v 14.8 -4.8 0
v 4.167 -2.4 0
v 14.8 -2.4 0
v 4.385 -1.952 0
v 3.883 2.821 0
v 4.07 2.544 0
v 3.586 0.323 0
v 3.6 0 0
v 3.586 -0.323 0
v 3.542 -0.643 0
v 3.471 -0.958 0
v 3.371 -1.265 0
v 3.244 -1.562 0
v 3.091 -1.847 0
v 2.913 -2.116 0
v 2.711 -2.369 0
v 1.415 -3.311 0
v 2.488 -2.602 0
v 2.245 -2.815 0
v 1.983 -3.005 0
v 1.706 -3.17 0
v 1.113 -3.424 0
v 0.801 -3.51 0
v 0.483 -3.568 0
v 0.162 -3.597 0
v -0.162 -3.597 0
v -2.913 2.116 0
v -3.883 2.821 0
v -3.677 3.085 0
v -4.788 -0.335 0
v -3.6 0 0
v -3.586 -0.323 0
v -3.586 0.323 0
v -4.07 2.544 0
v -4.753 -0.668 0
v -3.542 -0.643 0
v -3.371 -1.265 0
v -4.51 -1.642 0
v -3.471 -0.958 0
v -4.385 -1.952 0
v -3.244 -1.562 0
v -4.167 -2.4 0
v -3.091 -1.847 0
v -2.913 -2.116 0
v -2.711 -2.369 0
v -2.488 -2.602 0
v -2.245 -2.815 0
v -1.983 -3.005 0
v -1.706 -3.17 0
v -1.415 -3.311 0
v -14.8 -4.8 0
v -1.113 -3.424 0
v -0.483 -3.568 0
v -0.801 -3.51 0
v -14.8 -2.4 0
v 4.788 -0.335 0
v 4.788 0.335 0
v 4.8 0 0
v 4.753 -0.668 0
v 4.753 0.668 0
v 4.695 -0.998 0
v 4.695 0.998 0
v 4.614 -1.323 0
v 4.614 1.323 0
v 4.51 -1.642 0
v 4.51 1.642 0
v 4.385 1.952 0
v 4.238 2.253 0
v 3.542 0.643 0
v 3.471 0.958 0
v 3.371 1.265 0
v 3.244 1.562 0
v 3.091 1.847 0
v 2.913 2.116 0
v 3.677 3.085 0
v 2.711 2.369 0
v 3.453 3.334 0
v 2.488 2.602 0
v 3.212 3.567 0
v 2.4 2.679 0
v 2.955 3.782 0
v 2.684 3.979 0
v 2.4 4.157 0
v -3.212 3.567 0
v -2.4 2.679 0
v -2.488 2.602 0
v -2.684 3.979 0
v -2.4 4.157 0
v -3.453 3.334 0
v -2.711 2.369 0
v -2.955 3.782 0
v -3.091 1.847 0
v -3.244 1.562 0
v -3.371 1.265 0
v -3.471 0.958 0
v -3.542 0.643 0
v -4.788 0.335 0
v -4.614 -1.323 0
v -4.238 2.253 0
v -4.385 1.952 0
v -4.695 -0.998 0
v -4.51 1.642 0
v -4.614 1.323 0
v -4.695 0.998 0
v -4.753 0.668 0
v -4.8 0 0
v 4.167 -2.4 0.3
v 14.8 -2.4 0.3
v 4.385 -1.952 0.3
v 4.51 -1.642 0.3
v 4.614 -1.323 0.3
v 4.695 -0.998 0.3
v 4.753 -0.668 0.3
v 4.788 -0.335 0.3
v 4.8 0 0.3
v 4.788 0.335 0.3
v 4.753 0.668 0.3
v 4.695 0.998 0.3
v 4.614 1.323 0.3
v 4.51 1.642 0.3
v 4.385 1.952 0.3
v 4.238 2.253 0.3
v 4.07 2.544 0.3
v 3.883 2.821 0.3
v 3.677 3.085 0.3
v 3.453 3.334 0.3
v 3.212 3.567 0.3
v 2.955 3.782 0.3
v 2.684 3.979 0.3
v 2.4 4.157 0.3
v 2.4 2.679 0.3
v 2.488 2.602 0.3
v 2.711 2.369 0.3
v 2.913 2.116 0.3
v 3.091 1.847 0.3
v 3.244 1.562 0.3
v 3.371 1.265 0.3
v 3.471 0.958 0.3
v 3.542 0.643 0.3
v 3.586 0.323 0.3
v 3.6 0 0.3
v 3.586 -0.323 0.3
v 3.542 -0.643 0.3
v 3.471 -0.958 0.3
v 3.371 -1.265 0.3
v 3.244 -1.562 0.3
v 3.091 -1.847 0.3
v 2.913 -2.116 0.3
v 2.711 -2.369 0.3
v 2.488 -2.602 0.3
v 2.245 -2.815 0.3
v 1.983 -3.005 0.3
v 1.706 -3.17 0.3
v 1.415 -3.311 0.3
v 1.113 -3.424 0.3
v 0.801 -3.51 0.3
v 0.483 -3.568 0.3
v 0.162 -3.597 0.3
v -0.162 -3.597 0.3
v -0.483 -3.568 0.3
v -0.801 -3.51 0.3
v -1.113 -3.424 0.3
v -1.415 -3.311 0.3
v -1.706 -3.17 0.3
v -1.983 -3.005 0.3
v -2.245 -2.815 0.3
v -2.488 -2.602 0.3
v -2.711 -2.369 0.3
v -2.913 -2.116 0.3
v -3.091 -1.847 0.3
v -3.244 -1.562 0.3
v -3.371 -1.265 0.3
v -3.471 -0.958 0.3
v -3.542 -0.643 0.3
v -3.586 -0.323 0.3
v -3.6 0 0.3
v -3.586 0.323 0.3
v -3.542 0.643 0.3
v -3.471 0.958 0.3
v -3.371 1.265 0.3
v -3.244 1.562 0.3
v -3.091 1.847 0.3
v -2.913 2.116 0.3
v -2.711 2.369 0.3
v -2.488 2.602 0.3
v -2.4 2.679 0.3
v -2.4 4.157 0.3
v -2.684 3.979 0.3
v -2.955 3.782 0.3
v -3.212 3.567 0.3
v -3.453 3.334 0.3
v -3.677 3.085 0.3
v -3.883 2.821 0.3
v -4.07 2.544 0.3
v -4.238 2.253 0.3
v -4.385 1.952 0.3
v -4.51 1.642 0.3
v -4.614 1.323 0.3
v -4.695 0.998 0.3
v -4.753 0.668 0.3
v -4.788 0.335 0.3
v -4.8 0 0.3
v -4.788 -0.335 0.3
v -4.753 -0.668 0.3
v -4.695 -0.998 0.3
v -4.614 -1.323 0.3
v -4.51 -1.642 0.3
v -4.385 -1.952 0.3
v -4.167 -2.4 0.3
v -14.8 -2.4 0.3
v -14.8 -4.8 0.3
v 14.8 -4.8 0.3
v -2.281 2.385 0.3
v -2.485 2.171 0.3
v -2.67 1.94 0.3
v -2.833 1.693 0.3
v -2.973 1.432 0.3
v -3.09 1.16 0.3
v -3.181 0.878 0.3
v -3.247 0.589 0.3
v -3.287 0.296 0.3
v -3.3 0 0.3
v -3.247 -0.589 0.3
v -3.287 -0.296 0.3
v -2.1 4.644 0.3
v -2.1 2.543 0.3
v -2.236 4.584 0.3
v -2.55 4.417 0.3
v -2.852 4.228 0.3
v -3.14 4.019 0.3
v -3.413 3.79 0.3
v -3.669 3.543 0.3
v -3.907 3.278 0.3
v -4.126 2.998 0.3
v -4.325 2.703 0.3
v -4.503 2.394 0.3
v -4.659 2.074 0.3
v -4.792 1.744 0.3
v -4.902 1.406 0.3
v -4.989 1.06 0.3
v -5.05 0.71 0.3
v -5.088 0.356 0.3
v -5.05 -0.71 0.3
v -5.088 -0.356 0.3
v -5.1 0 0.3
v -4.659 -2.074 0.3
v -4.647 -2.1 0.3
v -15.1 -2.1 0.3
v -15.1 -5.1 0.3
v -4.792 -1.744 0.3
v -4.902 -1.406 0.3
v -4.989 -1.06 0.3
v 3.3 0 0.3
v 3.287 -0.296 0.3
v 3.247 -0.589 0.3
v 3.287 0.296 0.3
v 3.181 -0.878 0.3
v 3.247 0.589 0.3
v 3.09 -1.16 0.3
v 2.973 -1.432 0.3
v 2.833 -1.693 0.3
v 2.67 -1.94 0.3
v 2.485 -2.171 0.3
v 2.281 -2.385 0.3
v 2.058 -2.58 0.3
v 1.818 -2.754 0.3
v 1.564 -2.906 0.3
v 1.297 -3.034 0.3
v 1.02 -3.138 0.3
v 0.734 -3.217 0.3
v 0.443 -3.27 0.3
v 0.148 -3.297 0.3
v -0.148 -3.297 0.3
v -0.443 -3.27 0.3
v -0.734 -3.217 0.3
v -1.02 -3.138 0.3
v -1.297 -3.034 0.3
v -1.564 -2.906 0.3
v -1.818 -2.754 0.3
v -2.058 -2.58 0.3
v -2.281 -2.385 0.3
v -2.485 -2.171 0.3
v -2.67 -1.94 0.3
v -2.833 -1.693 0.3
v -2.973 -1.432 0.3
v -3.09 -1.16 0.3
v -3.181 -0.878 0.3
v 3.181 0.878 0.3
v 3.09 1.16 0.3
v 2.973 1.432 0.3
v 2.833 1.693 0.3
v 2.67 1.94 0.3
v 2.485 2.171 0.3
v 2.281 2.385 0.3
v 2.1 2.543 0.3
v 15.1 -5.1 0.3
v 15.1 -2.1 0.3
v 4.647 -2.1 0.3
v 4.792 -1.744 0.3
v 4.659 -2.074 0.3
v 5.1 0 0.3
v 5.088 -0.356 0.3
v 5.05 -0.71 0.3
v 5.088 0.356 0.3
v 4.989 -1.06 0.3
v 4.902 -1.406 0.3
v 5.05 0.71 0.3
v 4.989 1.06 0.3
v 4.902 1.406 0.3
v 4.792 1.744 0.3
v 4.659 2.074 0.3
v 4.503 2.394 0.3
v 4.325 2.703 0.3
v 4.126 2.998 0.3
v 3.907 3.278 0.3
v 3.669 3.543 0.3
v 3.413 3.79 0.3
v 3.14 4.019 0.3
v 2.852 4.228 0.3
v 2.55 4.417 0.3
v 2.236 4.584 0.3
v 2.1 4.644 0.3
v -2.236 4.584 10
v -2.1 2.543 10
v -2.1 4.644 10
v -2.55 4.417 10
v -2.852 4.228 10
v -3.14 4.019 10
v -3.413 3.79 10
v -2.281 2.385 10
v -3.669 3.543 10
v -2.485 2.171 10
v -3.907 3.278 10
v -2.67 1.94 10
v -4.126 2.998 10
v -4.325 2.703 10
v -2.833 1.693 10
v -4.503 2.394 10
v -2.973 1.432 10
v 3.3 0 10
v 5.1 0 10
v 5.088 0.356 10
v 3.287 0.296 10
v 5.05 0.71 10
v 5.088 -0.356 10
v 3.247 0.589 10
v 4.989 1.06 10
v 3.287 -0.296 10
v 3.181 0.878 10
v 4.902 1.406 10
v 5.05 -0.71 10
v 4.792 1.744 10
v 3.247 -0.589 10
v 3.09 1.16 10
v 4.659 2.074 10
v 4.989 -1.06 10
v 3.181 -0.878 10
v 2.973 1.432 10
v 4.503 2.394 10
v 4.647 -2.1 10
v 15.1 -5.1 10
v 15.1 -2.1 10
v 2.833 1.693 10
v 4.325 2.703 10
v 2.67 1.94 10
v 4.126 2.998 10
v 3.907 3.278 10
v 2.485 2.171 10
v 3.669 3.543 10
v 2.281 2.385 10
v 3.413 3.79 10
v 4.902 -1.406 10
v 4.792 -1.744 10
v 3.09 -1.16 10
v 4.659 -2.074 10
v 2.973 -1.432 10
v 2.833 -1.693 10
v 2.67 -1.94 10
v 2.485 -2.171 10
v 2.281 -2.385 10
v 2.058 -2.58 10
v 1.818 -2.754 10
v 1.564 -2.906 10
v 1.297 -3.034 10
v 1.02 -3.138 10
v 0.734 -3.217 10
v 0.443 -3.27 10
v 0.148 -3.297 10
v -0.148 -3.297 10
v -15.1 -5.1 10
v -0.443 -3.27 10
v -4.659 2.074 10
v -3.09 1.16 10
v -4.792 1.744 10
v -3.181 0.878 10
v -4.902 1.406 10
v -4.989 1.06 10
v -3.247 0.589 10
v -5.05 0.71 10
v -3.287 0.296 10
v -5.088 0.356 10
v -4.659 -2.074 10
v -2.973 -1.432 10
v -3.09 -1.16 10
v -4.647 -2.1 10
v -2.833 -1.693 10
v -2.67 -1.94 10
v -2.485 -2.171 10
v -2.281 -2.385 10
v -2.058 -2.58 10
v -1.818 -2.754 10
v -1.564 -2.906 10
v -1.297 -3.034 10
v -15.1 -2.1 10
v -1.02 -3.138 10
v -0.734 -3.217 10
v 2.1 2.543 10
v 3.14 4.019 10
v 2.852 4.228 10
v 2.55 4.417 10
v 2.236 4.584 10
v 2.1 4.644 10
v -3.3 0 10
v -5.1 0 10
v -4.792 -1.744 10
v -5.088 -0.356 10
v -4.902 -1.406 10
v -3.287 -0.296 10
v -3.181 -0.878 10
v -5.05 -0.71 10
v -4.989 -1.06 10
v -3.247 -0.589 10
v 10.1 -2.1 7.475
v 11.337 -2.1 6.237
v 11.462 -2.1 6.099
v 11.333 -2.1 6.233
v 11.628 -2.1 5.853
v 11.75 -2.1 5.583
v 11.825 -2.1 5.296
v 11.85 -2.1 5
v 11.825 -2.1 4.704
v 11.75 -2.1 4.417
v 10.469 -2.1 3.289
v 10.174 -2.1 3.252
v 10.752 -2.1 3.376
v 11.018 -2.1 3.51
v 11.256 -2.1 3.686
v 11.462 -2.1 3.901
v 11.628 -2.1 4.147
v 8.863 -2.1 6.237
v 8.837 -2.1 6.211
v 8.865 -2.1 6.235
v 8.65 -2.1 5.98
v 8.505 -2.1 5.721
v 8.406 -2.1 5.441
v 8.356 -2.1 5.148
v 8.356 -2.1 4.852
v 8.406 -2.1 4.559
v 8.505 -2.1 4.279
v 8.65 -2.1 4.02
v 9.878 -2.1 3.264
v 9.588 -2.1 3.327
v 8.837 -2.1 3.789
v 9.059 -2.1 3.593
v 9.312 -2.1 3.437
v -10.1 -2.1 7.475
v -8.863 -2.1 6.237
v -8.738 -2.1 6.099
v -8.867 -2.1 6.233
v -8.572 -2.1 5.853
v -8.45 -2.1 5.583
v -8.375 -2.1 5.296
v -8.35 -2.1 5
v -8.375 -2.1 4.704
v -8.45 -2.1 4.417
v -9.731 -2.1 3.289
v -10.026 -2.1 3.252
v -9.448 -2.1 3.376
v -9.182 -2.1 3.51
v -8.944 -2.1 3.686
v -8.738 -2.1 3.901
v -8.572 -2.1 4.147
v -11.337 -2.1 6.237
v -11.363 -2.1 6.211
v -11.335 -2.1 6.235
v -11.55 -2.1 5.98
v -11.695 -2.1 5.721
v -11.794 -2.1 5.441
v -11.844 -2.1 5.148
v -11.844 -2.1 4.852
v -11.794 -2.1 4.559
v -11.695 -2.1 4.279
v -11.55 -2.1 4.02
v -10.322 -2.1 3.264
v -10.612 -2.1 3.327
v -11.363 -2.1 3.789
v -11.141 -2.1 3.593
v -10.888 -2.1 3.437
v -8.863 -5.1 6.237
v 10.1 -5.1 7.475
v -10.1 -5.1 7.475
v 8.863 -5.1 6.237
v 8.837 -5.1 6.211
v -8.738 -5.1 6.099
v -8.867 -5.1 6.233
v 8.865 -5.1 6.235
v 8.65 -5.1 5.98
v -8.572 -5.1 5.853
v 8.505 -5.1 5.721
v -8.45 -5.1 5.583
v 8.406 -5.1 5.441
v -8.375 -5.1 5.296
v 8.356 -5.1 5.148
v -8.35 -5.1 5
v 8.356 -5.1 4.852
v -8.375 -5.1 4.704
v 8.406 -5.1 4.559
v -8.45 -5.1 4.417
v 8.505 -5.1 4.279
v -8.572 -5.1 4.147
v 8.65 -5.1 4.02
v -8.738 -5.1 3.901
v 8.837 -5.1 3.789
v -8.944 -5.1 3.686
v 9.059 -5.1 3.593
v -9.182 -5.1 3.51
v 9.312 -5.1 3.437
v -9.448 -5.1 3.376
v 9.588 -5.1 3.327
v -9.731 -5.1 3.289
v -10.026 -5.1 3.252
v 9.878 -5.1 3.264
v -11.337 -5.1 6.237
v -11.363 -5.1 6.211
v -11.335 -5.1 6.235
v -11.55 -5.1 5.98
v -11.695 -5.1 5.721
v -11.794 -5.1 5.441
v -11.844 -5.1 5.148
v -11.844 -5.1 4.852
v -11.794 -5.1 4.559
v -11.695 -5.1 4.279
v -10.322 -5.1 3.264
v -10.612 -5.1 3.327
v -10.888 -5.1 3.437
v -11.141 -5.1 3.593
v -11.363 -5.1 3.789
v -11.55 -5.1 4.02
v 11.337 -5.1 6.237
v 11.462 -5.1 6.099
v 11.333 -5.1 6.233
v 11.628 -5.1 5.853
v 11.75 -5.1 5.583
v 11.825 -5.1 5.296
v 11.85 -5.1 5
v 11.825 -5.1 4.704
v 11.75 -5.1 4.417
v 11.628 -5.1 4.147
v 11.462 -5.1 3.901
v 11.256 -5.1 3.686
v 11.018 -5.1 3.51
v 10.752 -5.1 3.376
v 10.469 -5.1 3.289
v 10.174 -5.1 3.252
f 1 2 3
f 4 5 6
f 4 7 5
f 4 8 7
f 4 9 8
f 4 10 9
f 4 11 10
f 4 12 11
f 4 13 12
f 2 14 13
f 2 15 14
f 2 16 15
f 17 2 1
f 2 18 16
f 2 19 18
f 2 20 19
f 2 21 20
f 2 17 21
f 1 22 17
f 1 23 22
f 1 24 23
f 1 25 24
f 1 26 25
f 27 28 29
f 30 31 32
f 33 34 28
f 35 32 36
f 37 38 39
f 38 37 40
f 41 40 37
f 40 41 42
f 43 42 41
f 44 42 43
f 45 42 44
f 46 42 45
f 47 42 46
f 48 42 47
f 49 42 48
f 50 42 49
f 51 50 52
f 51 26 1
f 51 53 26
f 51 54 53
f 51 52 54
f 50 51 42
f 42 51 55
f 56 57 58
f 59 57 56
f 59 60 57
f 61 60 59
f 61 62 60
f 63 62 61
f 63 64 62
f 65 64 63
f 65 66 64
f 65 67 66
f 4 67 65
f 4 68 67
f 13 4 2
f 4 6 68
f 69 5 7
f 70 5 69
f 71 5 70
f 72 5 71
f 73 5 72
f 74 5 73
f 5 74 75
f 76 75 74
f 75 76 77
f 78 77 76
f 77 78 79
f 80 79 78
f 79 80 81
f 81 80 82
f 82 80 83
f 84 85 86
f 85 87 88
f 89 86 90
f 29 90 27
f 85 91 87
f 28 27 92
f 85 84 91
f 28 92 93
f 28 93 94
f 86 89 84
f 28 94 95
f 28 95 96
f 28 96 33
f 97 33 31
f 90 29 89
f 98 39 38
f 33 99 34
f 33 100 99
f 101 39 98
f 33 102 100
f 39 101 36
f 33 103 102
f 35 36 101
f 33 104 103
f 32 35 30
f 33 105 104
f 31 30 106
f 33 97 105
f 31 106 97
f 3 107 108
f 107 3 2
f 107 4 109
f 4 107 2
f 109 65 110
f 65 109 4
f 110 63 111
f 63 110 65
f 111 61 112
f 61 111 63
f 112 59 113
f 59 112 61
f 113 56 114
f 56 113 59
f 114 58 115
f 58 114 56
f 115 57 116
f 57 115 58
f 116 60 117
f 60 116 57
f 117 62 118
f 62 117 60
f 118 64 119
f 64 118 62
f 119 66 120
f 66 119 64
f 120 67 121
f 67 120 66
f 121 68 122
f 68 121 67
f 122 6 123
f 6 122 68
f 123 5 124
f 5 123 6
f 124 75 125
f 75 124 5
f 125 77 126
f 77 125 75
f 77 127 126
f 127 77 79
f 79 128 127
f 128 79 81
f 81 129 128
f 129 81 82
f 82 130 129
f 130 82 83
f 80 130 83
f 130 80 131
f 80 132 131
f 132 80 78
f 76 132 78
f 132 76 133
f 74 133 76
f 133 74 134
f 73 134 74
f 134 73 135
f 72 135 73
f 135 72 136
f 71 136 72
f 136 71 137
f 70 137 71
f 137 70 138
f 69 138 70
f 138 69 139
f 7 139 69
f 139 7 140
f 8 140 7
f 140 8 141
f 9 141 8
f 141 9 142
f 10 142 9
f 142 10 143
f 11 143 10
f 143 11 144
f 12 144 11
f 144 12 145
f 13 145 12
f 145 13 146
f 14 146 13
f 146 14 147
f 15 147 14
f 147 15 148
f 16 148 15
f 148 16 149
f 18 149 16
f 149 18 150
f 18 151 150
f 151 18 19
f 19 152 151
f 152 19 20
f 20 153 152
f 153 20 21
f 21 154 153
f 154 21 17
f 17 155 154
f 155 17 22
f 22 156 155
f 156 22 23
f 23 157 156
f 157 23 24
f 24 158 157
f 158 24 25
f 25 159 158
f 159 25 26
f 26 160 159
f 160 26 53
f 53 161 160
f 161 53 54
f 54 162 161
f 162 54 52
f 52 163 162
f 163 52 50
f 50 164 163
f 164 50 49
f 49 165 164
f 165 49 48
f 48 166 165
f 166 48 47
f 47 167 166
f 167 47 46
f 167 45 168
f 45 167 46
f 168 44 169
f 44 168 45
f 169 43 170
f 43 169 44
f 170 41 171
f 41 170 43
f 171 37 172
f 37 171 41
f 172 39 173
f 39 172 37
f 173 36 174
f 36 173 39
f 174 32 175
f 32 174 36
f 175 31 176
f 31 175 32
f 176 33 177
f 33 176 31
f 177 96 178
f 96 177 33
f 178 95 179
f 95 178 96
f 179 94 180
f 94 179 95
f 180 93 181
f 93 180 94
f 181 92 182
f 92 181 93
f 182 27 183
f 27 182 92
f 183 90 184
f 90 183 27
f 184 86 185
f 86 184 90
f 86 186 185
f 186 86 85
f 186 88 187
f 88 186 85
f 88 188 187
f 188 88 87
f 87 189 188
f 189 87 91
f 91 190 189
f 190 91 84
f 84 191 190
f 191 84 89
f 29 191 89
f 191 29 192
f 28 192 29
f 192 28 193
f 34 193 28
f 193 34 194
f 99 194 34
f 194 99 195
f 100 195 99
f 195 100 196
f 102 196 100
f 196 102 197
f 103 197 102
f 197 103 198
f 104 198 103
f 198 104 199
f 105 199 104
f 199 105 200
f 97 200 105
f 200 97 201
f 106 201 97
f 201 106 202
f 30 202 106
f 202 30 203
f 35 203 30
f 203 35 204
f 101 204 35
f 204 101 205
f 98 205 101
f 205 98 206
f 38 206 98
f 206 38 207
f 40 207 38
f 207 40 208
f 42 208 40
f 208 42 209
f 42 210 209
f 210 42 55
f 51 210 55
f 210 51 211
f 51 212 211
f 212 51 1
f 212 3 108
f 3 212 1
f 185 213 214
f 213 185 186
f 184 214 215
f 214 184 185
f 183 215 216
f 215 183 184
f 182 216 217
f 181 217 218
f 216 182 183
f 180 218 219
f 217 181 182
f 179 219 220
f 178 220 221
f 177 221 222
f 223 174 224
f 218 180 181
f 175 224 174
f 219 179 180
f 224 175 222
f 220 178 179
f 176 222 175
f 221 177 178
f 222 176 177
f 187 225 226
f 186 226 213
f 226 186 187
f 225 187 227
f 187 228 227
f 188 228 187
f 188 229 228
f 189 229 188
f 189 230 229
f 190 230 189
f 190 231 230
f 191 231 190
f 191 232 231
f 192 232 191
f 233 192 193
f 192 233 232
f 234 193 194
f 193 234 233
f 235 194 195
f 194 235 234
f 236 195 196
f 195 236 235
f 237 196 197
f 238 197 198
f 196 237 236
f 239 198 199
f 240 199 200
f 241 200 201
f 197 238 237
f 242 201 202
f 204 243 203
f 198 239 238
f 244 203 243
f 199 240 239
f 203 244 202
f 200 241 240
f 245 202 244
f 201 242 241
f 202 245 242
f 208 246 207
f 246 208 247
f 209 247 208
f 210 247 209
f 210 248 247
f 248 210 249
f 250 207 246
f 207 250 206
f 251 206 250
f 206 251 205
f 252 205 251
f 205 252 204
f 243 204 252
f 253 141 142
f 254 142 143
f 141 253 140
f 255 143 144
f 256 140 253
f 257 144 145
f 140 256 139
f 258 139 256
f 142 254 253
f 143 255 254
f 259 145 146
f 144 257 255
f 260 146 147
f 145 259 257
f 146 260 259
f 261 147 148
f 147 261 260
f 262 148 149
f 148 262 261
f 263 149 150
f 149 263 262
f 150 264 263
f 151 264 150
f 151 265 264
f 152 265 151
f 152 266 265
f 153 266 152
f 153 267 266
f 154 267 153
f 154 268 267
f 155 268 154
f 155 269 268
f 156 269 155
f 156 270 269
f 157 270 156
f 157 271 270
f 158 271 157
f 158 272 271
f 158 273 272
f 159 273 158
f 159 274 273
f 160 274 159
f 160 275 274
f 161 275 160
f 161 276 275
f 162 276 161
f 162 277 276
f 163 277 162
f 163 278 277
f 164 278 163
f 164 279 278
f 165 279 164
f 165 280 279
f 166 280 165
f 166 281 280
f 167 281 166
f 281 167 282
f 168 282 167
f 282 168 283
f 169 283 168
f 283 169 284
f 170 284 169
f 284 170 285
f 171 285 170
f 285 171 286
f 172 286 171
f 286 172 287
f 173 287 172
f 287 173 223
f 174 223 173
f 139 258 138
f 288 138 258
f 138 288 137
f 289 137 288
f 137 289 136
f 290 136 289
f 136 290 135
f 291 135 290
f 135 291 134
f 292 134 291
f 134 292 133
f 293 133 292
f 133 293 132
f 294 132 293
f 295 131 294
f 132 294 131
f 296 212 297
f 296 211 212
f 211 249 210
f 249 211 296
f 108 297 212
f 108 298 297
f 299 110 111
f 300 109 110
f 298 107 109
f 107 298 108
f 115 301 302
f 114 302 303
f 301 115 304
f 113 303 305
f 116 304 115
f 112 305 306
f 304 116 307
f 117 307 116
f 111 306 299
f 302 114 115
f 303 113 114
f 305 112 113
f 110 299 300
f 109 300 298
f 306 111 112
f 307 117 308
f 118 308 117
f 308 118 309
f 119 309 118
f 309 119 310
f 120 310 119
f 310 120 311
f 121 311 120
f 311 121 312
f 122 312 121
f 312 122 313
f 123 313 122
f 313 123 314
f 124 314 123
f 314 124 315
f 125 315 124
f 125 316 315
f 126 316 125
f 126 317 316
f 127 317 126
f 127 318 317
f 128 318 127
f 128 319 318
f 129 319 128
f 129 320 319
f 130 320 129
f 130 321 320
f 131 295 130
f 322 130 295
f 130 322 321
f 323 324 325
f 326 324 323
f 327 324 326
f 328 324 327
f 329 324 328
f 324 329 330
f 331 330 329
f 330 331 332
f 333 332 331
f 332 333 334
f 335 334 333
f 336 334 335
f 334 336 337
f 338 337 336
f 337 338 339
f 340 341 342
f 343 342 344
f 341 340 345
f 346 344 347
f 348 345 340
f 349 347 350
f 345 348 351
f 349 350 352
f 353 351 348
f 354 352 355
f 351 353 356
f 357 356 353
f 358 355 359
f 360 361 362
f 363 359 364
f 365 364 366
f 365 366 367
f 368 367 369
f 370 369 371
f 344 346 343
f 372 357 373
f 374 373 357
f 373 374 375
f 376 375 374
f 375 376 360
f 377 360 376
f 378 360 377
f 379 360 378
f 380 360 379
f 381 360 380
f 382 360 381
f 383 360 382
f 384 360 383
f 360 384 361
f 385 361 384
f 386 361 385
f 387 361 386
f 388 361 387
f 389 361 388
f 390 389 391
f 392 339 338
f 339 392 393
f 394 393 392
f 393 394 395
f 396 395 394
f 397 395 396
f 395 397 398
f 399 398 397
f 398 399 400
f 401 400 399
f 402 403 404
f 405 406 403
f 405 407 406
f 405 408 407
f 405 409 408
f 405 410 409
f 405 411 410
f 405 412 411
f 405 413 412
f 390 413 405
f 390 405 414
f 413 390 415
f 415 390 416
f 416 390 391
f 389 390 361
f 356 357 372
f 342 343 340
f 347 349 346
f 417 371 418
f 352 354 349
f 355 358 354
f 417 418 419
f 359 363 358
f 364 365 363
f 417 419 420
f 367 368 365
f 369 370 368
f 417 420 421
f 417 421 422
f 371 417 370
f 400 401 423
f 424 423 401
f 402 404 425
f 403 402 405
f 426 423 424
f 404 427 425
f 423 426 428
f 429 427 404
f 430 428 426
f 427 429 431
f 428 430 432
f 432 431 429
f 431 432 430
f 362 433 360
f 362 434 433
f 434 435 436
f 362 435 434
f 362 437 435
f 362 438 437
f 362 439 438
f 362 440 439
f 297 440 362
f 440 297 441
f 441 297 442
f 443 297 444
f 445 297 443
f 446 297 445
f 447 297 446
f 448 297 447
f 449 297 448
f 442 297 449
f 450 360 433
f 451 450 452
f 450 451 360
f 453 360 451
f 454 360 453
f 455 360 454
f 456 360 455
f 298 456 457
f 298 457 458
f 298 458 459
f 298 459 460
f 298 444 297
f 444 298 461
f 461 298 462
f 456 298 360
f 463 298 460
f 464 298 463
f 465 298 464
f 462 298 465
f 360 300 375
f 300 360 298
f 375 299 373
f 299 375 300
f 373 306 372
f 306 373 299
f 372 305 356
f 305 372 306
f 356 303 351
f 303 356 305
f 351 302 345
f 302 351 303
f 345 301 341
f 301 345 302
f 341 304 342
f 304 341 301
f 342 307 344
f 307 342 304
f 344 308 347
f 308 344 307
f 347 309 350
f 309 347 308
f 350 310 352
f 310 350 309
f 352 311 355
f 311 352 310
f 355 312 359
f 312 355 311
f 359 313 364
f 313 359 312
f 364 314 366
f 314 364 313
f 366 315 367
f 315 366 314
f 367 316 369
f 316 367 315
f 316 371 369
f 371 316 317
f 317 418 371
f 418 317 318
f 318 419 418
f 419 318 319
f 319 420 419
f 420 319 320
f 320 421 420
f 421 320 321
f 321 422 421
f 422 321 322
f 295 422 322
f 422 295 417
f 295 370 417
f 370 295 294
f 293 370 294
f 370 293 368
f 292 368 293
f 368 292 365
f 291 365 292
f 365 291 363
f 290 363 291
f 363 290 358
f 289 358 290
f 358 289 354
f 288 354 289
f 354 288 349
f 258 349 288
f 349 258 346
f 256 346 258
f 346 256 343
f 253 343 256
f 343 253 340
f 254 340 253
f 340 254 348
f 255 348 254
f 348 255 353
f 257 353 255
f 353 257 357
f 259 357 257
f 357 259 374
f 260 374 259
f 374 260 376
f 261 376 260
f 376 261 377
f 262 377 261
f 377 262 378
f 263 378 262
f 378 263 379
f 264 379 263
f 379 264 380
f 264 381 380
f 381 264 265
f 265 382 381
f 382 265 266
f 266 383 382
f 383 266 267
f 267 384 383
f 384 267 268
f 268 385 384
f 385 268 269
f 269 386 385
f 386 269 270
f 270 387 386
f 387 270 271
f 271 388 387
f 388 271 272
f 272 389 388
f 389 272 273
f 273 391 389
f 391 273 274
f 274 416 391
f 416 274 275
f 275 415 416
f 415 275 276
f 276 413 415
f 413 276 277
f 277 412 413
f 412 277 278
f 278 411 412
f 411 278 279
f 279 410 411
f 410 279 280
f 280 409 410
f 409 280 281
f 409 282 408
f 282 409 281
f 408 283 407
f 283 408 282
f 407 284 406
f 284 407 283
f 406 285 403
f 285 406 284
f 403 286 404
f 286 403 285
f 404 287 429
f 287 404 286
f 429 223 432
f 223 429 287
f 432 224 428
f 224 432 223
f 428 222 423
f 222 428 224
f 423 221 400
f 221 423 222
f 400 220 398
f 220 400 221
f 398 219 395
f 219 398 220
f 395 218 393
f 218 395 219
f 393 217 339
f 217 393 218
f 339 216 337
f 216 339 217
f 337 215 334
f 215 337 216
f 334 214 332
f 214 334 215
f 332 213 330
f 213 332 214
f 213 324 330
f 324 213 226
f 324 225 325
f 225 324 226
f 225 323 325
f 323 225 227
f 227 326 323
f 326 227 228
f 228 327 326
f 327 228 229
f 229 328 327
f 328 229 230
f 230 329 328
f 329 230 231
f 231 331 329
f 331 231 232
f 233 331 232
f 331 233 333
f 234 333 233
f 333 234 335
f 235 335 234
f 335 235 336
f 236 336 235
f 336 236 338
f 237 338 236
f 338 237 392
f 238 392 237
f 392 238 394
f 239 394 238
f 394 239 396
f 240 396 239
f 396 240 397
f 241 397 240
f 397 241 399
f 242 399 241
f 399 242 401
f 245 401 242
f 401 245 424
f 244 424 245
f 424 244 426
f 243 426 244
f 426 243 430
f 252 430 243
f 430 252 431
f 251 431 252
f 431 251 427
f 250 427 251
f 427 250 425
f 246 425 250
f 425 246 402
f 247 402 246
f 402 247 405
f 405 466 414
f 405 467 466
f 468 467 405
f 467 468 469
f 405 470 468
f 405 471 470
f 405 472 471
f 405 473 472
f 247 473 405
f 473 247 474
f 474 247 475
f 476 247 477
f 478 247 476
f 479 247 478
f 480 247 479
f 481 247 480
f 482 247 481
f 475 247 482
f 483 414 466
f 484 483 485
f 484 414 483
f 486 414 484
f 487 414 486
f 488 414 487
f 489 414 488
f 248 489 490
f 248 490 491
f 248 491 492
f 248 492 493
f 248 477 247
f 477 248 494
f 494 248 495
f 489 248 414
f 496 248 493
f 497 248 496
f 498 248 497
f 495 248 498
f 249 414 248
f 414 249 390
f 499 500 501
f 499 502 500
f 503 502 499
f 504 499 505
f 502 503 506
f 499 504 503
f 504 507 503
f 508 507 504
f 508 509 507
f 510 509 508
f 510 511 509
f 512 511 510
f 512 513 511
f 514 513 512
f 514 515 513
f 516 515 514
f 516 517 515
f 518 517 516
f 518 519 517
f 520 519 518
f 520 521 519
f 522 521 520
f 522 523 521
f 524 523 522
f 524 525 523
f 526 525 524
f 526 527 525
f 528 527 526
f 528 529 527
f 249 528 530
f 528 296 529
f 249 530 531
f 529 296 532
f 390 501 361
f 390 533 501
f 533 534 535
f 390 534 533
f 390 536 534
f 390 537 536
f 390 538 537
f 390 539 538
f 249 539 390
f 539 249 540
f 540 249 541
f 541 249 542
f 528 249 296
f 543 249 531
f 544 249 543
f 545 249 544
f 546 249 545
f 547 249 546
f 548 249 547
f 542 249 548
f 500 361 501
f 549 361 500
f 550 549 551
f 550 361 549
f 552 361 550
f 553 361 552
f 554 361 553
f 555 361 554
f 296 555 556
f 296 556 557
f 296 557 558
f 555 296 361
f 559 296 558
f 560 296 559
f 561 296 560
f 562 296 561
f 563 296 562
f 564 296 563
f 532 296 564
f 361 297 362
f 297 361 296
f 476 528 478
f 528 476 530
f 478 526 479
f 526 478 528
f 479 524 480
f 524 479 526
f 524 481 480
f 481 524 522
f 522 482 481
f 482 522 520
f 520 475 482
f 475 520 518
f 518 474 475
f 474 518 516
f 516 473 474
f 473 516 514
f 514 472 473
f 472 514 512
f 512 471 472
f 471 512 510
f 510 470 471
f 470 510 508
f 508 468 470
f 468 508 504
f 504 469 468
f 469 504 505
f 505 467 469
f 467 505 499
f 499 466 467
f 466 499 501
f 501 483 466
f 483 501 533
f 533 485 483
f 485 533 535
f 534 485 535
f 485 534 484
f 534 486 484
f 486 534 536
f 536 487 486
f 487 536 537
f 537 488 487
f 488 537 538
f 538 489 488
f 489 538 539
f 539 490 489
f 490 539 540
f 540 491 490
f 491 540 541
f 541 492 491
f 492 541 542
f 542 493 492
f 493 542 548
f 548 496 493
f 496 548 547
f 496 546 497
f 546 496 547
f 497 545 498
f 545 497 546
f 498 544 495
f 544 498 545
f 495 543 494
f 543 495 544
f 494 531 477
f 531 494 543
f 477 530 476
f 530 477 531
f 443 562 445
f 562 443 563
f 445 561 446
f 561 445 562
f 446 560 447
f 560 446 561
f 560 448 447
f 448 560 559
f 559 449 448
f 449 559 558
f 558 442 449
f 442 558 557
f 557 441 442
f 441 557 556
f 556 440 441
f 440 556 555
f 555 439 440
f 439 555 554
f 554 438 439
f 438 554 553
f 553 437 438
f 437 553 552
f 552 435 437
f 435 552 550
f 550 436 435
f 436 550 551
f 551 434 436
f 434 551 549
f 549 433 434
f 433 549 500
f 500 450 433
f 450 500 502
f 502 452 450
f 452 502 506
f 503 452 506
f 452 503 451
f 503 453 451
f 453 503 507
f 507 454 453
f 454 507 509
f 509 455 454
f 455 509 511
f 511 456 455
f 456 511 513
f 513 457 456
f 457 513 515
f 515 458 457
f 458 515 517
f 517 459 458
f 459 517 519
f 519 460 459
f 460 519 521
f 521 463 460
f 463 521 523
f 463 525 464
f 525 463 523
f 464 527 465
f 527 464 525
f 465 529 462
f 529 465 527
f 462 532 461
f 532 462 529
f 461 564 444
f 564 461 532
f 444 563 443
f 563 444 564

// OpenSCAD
// @checkpoint parent= desc="Clip para cables a presión, para atornillar o pegar (plantilla)"
// Plantilla ScadLab: clip en C para uno o varios cables, sobre una base plana.
// Se imprime ACOSTADO (el perfil en C apoyado en la placa): las capas siguen
// el anillo y el clip flexiona sin partirse.

/* [Cable] */
cable_d = 6;         // [2:0.5:20]
cable_count = 1;     // [1:1:6]
// Apertura de la C respecto del diámetro del cable (< 1 para que retenga)
opening_ratio = 0.7; // [0.4:0.05:0.95]
// Juego radial entre el cable y el anillo
cable_clear = 0.3;   // [0:0.1:1]

/* [Clip] */
ring_t = 1.8;        // [1:0.2:4]
width = 10;          // [4:1:30]
base_t = 3;          // [1.6:0.2:6]

/* [Montaje] */
mount = "screw";     // [screw, adhesive]
screw_d = 3.5;       // [2:0.1:6]
head_d = 7;          // [4:0.5:12]

/* [Acabado] */
foot_inset = 0.3;    // [0:0.1:1]

/* [Colores] */
part_color = "#ECEFF1";

/* [Hidden] */
PLATE = [180, 180, 180];   // A1 mini; ajustar según printer.json
eps = 0.01;
$fa = $preview ? 12 : 4;
$fs = $preview ? 2 : 0.3;

r_in = cable_d / 2 + cable_clear;
r_out = r_in + ring_t;
gap = cable_d * opening_ratio;
pitch = 2 * r_out - ring_t;                            // anillos vecinos comparten pared
rings_len = (cable_count - 1) * pitch + 2 * r_out;
ear = mount == "screw" ? head_d + 3 : 2;
base_len = rings_len + 2 * ear;
base_y = -r_out;                                       // cara inferior de la base

assert(mount != "screw" || width >= head_d + 1, "width debe ser mayor que la cabeza del tornillo");
assert(gap < cable_d, "la apertura debe ser menor que el cable para retenerlo");
assert(base_len <= PLATE.x - 4 && width <= PLATE.z, str("No cabe en la placa ", PLATE));

// ---------- Ensamblado ----------
color(part_color) clip();

// ---------- Módulos ----------
function ring_x(i) = -rings_len / 2 + r_out + i * pitch;

module profile_2d() {
    difference() {
        union() {
            for (i = [0 : cable_count - 1]) translate([ring_x(i), 0]) circle(r = r_out);
            translate([-base_len / 2, base_y]) square([base_len, base_t]);
        }
        for (i = [0 : cable_count - 1]) {
            translate([ring_x(i), 0]) circle(r = r_in);
            translate([ring_x(i) - gap / 2, 0]) square([gap, r_out + 1]);   // apertura
        }
    }
}

module foot_compensated_extrude(h, c) {
    if (c > 0) linear_extrude(height = c + eps) offset(delta = -c) children();
    translate([0, 0, c]) linear_extrude(height = h - c) children();
}

module teardrop_2d(r) {
    union() {
        circle(r = r);
        rotate(45) square(r);
    }
}

// Agujero horizontal a lo largo de Y con la punta hacia +Z
module teardrop_hole(d, length) {
    rotate([90, 0, 0]) linear_extrude(height = length, center = true) teardrop_2d(d / 2);
}

module clip() {
    difference() {
        foot_compensated_extrude(width, foot_inset) profile_2d();
        if (mount == "screw")
            for (s = [-1, 1])
                translate([s * (base_len / 2 - ear / 2), base_y + base_t / 2, width / 2])
                    teardrop_hole(screw_d, base_t + 2);
    }
}
